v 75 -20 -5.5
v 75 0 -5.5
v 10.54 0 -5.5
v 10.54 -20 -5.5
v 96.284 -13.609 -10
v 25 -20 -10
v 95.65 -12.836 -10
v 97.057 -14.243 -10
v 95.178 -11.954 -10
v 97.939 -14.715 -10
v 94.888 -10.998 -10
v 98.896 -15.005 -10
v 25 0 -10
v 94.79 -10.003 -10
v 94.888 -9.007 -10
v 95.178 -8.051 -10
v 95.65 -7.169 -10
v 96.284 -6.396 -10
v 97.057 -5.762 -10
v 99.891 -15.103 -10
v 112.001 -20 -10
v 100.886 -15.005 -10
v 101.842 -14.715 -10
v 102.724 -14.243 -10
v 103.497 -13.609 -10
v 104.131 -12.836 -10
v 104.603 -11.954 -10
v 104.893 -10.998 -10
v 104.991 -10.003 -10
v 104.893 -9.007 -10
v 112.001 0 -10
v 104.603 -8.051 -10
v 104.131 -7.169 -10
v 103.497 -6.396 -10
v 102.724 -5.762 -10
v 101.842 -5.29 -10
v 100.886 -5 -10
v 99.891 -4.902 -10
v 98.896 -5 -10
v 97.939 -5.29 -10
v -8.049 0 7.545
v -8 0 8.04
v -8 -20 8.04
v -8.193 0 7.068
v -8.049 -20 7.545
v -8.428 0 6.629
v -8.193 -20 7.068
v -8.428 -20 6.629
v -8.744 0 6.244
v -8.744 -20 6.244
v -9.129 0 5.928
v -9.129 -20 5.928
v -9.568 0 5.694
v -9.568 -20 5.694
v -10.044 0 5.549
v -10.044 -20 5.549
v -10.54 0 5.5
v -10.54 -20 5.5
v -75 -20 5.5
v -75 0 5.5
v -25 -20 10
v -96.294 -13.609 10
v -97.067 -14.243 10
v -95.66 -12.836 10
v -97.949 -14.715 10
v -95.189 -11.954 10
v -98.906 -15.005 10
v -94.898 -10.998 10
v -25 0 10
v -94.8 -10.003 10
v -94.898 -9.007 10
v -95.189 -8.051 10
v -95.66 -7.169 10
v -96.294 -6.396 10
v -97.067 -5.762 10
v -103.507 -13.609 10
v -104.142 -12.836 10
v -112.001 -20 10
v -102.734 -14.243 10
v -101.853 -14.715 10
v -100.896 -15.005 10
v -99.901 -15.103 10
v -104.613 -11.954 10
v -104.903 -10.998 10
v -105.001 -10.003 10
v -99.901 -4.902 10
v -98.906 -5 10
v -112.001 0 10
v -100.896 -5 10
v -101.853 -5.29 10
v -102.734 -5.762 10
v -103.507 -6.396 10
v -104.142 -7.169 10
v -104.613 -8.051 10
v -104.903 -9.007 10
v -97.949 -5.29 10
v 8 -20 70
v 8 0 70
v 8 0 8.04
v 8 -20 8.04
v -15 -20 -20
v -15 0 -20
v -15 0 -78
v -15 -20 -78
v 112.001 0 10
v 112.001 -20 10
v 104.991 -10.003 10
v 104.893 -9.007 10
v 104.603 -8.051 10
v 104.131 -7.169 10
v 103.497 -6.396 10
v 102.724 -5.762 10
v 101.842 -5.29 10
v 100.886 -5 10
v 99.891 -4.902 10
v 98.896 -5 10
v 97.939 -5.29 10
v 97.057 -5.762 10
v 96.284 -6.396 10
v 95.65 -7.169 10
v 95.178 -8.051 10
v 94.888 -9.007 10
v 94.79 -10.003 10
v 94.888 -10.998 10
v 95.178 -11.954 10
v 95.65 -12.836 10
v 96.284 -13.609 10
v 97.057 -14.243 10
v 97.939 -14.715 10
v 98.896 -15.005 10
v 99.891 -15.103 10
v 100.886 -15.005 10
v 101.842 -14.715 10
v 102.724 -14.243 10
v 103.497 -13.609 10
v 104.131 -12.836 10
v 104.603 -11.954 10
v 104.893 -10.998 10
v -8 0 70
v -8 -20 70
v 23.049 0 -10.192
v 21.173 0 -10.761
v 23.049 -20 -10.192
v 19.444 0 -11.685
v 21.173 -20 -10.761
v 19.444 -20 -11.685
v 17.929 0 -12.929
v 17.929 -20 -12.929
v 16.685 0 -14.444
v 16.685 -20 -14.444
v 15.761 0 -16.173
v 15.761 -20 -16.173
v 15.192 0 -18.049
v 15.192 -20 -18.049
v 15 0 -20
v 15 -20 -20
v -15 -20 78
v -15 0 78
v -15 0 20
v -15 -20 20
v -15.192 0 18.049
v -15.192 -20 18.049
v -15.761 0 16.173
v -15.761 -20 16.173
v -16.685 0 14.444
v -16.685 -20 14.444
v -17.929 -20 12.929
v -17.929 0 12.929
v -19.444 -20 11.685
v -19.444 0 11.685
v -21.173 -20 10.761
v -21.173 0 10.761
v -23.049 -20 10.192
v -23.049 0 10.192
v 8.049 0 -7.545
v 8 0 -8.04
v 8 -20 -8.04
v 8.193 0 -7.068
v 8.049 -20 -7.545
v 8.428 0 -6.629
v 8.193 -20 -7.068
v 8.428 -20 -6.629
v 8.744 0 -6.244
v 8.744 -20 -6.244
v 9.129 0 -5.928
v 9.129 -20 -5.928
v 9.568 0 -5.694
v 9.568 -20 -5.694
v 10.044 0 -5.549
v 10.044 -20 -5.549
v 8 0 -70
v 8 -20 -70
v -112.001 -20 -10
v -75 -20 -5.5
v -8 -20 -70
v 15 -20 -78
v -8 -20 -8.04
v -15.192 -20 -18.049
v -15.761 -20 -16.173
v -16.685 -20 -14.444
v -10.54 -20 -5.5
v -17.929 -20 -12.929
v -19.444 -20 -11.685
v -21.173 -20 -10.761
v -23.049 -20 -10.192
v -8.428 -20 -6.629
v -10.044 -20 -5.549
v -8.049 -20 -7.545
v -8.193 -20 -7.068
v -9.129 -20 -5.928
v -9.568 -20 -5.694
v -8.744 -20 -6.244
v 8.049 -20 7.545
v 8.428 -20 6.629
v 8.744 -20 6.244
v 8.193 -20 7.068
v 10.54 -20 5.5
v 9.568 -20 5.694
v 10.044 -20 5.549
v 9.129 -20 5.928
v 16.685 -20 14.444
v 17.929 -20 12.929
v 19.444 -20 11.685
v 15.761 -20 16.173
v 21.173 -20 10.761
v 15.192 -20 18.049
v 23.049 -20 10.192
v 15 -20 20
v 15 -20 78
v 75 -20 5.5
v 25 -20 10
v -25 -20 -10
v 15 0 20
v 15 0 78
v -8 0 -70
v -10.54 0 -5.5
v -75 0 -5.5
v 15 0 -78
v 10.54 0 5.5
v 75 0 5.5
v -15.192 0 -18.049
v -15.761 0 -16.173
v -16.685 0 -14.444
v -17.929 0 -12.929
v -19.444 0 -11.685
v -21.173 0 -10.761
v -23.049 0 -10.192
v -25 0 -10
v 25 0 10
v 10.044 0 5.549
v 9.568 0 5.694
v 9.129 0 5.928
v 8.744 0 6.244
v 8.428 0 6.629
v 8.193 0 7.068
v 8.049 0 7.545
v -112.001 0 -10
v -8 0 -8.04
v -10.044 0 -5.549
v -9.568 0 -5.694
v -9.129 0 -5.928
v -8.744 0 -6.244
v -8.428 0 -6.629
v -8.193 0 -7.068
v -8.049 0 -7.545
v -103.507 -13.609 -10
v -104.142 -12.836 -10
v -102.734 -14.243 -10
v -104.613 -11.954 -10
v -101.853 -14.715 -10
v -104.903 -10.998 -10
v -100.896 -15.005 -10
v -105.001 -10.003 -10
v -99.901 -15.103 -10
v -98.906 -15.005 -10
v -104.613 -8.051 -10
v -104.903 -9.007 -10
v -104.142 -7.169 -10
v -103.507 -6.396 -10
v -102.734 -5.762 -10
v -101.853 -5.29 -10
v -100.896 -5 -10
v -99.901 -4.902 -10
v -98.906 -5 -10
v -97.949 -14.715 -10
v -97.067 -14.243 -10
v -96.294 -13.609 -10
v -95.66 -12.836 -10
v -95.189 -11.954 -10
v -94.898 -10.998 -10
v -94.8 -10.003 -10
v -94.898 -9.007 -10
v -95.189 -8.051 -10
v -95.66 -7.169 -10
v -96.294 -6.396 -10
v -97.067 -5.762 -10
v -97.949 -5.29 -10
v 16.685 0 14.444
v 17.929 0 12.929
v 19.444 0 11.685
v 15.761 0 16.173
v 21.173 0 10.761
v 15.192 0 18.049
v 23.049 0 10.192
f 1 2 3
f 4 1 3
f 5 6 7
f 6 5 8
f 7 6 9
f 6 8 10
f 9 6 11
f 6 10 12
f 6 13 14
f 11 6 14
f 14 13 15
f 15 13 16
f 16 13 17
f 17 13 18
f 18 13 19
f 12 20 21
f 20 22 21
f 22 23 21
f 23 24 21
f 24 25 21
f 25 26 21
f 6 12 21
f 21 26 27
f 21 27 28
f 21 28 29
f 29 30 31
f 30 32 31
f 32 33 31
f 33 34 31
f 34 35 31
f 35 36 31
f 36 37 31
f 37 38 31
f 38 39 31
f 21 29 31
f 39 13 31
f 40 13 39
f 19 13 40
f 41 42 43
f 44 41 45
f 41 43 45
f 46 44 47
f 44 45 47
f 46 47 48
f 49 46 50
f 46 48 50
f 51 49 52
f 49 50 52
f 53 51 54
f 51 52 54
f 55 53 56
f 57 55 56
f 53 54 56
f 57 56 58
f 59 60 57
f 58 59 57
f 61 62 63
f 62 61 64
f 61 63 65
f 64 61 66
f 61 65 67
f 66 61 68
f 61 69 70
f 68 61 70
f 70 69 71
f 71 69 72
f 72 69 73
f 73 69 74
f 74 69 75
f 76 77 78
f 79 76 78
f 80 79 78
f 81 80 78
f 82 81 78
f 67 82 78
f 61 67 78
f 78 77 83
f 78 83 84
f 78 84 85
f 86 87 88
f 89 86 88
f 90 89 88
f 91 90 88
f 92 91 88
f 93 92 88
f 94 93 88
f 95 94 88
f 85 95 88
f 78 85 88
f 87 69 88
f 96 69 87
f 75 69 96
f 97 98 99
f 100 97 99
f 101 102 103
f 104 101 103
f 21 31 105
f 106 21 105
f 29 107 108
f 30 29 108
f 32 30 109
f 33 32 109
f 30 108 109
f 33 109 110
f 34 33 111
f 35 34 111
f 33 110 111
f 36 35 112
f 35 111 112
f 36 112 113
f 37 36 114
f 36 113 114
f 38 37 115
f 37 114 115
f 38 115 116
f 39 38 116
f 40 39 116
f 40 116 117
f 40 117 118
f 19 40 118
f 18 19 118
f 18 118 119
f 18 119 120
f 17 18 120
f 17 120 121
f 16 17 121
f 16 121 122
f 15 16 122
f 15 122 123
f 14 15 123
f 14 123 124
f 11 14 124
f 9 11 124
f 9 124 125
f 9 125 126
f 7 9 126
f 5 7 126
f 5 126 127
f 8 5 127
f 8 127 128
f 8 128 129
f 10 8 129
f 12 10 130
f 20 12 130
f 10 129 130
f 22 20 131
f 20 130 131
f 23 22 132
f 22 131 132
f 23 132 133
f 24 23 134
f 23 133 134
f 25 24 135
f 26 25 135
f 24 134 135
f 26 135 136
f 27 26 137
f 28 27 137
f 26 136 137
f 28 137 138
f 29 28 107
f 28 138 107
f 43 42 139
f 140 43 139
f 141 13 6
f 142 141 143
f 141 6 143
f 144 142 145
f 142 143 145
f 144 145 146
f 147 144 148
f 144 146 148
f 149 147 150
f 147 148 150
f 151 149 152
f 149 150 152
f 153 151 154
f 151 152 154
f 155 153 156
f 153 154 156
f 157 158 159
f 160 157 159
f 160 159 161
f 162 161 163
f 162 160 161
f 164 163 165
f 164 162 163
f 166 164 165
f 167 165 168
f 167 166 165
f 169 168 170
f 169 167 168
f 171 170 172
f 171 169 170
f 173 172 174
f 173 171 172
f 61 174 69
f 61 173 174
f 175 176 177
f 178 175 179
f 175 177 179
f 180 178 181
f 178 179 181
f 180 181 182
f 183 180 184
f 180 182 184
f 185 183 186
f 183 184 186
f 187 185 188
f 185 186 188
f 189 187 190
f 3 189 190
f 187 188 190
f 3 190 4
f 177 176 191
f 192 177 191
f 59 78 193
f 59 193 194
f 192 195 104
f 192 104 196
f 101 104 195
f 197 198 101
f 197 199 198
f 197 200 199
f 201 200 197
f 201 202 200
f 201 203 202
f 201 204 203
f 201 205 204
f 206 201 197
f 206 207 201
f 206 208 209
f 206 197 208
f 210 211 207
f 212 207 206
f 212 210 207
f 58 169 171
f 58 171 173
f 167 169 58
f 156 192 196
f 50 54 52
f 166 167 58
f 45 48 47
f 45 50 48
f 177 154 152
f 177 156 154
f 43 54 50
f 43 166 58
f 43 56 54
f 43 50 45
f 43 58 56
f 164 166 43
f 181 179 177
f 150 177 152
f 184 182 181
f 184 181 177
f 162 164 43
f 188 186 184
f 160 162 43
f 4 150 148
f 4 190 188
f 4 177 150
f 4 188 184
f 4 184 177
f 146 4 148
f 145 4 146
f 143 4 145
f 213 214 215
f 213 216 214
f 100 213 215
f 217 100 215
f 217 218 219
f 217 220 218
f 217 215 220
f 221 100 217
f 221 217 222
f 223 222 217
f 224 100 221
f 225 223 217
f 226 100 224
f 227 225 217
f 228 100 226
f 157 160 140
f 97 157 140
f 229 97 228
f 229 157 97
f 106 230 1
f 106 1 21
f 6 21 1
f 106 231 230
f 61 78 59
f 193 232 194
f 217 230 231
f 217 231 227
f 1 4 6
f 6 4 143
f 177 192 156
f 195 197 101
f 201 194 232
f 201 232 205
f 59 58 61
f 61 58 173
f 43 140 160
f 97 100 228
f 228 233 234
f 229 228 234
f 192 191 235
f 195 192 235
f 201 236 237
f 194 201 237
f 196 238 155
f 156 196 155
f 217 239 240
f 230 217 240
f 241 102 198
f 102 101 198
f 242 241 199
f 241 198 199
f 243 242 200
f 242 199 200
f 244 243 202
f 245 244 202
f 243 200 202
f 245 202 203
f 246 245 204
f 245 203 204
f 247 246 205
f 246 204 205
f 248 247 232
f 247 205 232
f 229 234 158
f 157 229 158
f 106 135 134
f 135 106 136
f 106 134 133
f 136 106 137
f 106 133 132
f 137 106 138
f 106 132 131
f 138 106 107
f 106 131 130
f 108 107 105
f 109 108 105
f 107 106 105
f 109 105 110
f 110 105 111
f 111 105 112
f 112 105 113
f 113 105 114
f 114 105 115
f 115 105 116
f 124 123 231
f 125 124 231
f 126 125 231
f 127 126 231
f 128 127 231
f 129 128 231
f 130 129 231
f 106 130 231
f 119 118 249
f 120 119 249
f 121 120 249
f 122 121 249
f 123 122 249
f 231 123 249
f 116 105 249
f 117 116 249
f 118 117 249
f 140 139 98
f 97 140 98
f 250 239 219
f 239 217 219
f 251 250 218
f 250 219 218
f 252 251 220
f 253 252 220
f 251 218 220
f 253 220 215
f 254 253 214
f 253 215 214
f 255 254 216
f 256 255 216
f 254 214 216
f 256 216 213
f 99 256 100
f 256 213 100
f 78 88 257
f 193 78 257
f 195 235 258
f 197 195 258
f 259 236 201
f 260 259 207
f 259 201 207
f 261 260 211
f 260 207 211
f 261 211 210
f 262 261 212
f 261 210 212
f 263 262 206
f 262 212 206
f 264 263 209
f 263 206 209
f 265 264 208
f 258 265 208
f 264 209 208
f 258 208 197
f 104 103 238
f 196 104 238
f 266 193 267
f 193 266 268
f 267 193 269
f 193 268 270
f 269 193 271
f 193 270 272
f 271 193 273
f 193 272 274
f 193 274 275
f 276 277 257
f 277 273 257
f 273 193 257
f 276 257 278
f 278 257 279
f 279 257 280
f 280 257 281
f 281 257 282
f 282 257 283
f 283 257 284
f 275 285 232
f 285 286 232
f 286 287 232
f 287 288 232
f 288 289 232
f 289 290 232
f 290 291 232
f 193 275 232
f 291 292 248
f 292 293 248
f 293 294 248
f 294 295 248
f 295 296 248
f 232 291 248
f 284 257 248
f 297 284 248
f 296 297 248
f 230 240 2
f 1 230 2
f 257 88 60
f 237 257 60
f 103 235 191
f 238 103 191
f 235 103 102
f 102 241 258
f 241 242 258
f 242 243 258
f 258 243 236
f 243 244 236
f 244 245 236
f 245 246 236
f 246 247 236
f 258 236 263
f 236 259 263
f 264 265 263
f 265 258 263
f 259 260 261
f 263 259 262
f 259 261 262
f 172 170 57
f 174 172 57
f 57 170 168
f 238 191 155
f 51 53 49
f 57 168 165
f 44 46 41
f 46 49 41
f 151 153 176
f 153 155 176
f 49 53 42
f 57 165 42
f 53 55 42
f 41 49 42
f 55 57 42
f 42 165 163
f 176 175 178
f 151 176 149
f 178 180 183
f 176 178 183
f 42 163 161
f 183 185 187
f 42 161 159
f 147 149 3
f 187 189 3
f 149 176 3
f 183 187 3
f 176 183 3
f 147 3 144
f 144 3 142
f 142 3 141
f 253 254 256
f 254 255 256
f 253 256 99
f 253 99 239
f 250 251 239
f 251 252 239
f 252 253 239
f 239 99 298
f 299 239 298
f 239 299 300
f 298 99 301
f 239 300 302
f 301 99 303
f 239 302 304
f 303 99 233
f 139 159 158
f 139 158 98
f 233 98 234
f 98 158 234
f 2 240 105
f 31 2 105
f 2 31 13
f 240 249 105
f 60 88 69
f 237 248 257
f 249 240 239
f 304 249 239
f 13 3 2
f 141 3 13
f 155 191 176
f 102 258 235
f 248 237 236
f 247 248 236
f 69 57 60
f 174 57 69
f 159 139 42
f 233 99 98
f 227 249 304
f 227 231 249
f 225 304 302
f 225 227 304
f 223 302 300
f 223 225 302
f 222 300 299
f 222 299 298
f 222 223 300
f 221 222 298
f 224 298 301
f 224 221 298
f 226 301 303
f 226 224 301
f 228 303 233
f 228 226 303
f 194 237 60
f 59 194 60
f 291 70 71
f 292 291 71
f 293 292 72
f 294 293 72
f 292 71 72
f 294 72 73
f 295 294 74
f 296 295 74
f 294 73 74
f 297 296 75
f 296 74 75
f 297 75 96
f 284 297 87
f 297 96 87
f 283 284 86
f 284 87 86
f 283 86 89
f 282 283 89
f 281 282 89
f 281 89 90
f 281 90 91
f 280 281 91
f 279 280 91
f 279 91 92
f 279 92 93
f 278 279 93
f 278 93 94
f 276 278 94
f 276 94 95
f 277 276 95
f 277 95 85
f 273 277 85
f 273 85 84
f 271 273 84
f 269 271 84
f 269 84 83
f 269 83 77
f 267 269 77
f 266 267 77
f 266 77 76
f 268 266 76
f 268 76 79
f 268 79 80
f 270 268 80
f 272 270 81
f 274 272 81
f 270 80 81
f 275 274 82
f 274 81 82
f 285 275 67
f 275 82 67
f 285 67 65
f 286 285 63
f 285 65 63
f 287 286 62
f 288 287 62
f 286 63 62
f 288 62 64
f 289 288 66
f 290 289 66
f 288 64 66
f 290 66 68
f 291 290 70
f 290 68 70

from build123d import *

# Parameters (mm, degrees)
F1_DEPTH = 19.99996
F2_R     = 9.99998
F3_R     = 2.54
F4_R     = 5.10032
F5_DEPTH = 105.918


with BuildPart() as f1:
    # F0 (on Front) → F1 (new body)
    with BuildSketch(Plane.XZ):
        Polygon((14.99997, -9.99998), (112.0013, -9.99998), (112.0013, 9.99998), (14.99997, 9.99998), (14.99997, 77.99959), (-14.99997, 77.99959), (-14.99997, 9.99998), (-112.0013, 9.99998), (-112.0013, -9.99998), (-14.99997, -9.99998), (-14.99997, -77.99959), (14.99997, -77.99959), align=None)
        Polygon((74.99985, 5.50037), (74.99985, -5.50037), (7.99973, -5.50037), (7.99973, -69.99986), (-7.99973, -69.99986), (-7.99973, -5.50037), (-74.99985, -5.50037), (-74.99985, 5.50037), (-7.99973, 5.50037), (-7.99973, 69.99986), (7.99973, 69.99986), (7.99973, 5.50037), align=None, mode=Mode.SUBTRACT)
    extrude(amount=F1_DEPTH)

    # F2
    f2_edges = [f1.edges().sort_by_distance(p)[0] for p in [
        (14.99997, -9.99998, 9.99998),
        (-14.99997, -9.99998, 9.99998),
        (-14.99997, -9.99998, -9.99998),
        (14.99997, -9.99998, -9.99998),
    ]]
    fillet(f2_edges, radius=F2_R)

    # F3
    f3_edges = [f1.edges().sort_by_distance(p)[0] for p in [
        (-7.99973, -9.99998, 5.50037),
        (7.99973, -9.99998, 5.50037),
        (7.99973, -9.99998, -5.50037),
        (-7.99973, -9.99998, -5.50037),
    ]]
    fillet(f3_edges, radius=F3_R)

    # F4 (on face) → F5 (cut)
    with BuildSketch(Plane.XY.offset(9.99998)):
        with Locations((-99.90074, -10.00252)):
            Circle(F4_R)
        with Locations((99.89058, -10.00252)):
            Circle(F4_R)
    extrude(amount=-F5_DEPTH, mode=Mode.SUBTRACT)


solid = f1.part
